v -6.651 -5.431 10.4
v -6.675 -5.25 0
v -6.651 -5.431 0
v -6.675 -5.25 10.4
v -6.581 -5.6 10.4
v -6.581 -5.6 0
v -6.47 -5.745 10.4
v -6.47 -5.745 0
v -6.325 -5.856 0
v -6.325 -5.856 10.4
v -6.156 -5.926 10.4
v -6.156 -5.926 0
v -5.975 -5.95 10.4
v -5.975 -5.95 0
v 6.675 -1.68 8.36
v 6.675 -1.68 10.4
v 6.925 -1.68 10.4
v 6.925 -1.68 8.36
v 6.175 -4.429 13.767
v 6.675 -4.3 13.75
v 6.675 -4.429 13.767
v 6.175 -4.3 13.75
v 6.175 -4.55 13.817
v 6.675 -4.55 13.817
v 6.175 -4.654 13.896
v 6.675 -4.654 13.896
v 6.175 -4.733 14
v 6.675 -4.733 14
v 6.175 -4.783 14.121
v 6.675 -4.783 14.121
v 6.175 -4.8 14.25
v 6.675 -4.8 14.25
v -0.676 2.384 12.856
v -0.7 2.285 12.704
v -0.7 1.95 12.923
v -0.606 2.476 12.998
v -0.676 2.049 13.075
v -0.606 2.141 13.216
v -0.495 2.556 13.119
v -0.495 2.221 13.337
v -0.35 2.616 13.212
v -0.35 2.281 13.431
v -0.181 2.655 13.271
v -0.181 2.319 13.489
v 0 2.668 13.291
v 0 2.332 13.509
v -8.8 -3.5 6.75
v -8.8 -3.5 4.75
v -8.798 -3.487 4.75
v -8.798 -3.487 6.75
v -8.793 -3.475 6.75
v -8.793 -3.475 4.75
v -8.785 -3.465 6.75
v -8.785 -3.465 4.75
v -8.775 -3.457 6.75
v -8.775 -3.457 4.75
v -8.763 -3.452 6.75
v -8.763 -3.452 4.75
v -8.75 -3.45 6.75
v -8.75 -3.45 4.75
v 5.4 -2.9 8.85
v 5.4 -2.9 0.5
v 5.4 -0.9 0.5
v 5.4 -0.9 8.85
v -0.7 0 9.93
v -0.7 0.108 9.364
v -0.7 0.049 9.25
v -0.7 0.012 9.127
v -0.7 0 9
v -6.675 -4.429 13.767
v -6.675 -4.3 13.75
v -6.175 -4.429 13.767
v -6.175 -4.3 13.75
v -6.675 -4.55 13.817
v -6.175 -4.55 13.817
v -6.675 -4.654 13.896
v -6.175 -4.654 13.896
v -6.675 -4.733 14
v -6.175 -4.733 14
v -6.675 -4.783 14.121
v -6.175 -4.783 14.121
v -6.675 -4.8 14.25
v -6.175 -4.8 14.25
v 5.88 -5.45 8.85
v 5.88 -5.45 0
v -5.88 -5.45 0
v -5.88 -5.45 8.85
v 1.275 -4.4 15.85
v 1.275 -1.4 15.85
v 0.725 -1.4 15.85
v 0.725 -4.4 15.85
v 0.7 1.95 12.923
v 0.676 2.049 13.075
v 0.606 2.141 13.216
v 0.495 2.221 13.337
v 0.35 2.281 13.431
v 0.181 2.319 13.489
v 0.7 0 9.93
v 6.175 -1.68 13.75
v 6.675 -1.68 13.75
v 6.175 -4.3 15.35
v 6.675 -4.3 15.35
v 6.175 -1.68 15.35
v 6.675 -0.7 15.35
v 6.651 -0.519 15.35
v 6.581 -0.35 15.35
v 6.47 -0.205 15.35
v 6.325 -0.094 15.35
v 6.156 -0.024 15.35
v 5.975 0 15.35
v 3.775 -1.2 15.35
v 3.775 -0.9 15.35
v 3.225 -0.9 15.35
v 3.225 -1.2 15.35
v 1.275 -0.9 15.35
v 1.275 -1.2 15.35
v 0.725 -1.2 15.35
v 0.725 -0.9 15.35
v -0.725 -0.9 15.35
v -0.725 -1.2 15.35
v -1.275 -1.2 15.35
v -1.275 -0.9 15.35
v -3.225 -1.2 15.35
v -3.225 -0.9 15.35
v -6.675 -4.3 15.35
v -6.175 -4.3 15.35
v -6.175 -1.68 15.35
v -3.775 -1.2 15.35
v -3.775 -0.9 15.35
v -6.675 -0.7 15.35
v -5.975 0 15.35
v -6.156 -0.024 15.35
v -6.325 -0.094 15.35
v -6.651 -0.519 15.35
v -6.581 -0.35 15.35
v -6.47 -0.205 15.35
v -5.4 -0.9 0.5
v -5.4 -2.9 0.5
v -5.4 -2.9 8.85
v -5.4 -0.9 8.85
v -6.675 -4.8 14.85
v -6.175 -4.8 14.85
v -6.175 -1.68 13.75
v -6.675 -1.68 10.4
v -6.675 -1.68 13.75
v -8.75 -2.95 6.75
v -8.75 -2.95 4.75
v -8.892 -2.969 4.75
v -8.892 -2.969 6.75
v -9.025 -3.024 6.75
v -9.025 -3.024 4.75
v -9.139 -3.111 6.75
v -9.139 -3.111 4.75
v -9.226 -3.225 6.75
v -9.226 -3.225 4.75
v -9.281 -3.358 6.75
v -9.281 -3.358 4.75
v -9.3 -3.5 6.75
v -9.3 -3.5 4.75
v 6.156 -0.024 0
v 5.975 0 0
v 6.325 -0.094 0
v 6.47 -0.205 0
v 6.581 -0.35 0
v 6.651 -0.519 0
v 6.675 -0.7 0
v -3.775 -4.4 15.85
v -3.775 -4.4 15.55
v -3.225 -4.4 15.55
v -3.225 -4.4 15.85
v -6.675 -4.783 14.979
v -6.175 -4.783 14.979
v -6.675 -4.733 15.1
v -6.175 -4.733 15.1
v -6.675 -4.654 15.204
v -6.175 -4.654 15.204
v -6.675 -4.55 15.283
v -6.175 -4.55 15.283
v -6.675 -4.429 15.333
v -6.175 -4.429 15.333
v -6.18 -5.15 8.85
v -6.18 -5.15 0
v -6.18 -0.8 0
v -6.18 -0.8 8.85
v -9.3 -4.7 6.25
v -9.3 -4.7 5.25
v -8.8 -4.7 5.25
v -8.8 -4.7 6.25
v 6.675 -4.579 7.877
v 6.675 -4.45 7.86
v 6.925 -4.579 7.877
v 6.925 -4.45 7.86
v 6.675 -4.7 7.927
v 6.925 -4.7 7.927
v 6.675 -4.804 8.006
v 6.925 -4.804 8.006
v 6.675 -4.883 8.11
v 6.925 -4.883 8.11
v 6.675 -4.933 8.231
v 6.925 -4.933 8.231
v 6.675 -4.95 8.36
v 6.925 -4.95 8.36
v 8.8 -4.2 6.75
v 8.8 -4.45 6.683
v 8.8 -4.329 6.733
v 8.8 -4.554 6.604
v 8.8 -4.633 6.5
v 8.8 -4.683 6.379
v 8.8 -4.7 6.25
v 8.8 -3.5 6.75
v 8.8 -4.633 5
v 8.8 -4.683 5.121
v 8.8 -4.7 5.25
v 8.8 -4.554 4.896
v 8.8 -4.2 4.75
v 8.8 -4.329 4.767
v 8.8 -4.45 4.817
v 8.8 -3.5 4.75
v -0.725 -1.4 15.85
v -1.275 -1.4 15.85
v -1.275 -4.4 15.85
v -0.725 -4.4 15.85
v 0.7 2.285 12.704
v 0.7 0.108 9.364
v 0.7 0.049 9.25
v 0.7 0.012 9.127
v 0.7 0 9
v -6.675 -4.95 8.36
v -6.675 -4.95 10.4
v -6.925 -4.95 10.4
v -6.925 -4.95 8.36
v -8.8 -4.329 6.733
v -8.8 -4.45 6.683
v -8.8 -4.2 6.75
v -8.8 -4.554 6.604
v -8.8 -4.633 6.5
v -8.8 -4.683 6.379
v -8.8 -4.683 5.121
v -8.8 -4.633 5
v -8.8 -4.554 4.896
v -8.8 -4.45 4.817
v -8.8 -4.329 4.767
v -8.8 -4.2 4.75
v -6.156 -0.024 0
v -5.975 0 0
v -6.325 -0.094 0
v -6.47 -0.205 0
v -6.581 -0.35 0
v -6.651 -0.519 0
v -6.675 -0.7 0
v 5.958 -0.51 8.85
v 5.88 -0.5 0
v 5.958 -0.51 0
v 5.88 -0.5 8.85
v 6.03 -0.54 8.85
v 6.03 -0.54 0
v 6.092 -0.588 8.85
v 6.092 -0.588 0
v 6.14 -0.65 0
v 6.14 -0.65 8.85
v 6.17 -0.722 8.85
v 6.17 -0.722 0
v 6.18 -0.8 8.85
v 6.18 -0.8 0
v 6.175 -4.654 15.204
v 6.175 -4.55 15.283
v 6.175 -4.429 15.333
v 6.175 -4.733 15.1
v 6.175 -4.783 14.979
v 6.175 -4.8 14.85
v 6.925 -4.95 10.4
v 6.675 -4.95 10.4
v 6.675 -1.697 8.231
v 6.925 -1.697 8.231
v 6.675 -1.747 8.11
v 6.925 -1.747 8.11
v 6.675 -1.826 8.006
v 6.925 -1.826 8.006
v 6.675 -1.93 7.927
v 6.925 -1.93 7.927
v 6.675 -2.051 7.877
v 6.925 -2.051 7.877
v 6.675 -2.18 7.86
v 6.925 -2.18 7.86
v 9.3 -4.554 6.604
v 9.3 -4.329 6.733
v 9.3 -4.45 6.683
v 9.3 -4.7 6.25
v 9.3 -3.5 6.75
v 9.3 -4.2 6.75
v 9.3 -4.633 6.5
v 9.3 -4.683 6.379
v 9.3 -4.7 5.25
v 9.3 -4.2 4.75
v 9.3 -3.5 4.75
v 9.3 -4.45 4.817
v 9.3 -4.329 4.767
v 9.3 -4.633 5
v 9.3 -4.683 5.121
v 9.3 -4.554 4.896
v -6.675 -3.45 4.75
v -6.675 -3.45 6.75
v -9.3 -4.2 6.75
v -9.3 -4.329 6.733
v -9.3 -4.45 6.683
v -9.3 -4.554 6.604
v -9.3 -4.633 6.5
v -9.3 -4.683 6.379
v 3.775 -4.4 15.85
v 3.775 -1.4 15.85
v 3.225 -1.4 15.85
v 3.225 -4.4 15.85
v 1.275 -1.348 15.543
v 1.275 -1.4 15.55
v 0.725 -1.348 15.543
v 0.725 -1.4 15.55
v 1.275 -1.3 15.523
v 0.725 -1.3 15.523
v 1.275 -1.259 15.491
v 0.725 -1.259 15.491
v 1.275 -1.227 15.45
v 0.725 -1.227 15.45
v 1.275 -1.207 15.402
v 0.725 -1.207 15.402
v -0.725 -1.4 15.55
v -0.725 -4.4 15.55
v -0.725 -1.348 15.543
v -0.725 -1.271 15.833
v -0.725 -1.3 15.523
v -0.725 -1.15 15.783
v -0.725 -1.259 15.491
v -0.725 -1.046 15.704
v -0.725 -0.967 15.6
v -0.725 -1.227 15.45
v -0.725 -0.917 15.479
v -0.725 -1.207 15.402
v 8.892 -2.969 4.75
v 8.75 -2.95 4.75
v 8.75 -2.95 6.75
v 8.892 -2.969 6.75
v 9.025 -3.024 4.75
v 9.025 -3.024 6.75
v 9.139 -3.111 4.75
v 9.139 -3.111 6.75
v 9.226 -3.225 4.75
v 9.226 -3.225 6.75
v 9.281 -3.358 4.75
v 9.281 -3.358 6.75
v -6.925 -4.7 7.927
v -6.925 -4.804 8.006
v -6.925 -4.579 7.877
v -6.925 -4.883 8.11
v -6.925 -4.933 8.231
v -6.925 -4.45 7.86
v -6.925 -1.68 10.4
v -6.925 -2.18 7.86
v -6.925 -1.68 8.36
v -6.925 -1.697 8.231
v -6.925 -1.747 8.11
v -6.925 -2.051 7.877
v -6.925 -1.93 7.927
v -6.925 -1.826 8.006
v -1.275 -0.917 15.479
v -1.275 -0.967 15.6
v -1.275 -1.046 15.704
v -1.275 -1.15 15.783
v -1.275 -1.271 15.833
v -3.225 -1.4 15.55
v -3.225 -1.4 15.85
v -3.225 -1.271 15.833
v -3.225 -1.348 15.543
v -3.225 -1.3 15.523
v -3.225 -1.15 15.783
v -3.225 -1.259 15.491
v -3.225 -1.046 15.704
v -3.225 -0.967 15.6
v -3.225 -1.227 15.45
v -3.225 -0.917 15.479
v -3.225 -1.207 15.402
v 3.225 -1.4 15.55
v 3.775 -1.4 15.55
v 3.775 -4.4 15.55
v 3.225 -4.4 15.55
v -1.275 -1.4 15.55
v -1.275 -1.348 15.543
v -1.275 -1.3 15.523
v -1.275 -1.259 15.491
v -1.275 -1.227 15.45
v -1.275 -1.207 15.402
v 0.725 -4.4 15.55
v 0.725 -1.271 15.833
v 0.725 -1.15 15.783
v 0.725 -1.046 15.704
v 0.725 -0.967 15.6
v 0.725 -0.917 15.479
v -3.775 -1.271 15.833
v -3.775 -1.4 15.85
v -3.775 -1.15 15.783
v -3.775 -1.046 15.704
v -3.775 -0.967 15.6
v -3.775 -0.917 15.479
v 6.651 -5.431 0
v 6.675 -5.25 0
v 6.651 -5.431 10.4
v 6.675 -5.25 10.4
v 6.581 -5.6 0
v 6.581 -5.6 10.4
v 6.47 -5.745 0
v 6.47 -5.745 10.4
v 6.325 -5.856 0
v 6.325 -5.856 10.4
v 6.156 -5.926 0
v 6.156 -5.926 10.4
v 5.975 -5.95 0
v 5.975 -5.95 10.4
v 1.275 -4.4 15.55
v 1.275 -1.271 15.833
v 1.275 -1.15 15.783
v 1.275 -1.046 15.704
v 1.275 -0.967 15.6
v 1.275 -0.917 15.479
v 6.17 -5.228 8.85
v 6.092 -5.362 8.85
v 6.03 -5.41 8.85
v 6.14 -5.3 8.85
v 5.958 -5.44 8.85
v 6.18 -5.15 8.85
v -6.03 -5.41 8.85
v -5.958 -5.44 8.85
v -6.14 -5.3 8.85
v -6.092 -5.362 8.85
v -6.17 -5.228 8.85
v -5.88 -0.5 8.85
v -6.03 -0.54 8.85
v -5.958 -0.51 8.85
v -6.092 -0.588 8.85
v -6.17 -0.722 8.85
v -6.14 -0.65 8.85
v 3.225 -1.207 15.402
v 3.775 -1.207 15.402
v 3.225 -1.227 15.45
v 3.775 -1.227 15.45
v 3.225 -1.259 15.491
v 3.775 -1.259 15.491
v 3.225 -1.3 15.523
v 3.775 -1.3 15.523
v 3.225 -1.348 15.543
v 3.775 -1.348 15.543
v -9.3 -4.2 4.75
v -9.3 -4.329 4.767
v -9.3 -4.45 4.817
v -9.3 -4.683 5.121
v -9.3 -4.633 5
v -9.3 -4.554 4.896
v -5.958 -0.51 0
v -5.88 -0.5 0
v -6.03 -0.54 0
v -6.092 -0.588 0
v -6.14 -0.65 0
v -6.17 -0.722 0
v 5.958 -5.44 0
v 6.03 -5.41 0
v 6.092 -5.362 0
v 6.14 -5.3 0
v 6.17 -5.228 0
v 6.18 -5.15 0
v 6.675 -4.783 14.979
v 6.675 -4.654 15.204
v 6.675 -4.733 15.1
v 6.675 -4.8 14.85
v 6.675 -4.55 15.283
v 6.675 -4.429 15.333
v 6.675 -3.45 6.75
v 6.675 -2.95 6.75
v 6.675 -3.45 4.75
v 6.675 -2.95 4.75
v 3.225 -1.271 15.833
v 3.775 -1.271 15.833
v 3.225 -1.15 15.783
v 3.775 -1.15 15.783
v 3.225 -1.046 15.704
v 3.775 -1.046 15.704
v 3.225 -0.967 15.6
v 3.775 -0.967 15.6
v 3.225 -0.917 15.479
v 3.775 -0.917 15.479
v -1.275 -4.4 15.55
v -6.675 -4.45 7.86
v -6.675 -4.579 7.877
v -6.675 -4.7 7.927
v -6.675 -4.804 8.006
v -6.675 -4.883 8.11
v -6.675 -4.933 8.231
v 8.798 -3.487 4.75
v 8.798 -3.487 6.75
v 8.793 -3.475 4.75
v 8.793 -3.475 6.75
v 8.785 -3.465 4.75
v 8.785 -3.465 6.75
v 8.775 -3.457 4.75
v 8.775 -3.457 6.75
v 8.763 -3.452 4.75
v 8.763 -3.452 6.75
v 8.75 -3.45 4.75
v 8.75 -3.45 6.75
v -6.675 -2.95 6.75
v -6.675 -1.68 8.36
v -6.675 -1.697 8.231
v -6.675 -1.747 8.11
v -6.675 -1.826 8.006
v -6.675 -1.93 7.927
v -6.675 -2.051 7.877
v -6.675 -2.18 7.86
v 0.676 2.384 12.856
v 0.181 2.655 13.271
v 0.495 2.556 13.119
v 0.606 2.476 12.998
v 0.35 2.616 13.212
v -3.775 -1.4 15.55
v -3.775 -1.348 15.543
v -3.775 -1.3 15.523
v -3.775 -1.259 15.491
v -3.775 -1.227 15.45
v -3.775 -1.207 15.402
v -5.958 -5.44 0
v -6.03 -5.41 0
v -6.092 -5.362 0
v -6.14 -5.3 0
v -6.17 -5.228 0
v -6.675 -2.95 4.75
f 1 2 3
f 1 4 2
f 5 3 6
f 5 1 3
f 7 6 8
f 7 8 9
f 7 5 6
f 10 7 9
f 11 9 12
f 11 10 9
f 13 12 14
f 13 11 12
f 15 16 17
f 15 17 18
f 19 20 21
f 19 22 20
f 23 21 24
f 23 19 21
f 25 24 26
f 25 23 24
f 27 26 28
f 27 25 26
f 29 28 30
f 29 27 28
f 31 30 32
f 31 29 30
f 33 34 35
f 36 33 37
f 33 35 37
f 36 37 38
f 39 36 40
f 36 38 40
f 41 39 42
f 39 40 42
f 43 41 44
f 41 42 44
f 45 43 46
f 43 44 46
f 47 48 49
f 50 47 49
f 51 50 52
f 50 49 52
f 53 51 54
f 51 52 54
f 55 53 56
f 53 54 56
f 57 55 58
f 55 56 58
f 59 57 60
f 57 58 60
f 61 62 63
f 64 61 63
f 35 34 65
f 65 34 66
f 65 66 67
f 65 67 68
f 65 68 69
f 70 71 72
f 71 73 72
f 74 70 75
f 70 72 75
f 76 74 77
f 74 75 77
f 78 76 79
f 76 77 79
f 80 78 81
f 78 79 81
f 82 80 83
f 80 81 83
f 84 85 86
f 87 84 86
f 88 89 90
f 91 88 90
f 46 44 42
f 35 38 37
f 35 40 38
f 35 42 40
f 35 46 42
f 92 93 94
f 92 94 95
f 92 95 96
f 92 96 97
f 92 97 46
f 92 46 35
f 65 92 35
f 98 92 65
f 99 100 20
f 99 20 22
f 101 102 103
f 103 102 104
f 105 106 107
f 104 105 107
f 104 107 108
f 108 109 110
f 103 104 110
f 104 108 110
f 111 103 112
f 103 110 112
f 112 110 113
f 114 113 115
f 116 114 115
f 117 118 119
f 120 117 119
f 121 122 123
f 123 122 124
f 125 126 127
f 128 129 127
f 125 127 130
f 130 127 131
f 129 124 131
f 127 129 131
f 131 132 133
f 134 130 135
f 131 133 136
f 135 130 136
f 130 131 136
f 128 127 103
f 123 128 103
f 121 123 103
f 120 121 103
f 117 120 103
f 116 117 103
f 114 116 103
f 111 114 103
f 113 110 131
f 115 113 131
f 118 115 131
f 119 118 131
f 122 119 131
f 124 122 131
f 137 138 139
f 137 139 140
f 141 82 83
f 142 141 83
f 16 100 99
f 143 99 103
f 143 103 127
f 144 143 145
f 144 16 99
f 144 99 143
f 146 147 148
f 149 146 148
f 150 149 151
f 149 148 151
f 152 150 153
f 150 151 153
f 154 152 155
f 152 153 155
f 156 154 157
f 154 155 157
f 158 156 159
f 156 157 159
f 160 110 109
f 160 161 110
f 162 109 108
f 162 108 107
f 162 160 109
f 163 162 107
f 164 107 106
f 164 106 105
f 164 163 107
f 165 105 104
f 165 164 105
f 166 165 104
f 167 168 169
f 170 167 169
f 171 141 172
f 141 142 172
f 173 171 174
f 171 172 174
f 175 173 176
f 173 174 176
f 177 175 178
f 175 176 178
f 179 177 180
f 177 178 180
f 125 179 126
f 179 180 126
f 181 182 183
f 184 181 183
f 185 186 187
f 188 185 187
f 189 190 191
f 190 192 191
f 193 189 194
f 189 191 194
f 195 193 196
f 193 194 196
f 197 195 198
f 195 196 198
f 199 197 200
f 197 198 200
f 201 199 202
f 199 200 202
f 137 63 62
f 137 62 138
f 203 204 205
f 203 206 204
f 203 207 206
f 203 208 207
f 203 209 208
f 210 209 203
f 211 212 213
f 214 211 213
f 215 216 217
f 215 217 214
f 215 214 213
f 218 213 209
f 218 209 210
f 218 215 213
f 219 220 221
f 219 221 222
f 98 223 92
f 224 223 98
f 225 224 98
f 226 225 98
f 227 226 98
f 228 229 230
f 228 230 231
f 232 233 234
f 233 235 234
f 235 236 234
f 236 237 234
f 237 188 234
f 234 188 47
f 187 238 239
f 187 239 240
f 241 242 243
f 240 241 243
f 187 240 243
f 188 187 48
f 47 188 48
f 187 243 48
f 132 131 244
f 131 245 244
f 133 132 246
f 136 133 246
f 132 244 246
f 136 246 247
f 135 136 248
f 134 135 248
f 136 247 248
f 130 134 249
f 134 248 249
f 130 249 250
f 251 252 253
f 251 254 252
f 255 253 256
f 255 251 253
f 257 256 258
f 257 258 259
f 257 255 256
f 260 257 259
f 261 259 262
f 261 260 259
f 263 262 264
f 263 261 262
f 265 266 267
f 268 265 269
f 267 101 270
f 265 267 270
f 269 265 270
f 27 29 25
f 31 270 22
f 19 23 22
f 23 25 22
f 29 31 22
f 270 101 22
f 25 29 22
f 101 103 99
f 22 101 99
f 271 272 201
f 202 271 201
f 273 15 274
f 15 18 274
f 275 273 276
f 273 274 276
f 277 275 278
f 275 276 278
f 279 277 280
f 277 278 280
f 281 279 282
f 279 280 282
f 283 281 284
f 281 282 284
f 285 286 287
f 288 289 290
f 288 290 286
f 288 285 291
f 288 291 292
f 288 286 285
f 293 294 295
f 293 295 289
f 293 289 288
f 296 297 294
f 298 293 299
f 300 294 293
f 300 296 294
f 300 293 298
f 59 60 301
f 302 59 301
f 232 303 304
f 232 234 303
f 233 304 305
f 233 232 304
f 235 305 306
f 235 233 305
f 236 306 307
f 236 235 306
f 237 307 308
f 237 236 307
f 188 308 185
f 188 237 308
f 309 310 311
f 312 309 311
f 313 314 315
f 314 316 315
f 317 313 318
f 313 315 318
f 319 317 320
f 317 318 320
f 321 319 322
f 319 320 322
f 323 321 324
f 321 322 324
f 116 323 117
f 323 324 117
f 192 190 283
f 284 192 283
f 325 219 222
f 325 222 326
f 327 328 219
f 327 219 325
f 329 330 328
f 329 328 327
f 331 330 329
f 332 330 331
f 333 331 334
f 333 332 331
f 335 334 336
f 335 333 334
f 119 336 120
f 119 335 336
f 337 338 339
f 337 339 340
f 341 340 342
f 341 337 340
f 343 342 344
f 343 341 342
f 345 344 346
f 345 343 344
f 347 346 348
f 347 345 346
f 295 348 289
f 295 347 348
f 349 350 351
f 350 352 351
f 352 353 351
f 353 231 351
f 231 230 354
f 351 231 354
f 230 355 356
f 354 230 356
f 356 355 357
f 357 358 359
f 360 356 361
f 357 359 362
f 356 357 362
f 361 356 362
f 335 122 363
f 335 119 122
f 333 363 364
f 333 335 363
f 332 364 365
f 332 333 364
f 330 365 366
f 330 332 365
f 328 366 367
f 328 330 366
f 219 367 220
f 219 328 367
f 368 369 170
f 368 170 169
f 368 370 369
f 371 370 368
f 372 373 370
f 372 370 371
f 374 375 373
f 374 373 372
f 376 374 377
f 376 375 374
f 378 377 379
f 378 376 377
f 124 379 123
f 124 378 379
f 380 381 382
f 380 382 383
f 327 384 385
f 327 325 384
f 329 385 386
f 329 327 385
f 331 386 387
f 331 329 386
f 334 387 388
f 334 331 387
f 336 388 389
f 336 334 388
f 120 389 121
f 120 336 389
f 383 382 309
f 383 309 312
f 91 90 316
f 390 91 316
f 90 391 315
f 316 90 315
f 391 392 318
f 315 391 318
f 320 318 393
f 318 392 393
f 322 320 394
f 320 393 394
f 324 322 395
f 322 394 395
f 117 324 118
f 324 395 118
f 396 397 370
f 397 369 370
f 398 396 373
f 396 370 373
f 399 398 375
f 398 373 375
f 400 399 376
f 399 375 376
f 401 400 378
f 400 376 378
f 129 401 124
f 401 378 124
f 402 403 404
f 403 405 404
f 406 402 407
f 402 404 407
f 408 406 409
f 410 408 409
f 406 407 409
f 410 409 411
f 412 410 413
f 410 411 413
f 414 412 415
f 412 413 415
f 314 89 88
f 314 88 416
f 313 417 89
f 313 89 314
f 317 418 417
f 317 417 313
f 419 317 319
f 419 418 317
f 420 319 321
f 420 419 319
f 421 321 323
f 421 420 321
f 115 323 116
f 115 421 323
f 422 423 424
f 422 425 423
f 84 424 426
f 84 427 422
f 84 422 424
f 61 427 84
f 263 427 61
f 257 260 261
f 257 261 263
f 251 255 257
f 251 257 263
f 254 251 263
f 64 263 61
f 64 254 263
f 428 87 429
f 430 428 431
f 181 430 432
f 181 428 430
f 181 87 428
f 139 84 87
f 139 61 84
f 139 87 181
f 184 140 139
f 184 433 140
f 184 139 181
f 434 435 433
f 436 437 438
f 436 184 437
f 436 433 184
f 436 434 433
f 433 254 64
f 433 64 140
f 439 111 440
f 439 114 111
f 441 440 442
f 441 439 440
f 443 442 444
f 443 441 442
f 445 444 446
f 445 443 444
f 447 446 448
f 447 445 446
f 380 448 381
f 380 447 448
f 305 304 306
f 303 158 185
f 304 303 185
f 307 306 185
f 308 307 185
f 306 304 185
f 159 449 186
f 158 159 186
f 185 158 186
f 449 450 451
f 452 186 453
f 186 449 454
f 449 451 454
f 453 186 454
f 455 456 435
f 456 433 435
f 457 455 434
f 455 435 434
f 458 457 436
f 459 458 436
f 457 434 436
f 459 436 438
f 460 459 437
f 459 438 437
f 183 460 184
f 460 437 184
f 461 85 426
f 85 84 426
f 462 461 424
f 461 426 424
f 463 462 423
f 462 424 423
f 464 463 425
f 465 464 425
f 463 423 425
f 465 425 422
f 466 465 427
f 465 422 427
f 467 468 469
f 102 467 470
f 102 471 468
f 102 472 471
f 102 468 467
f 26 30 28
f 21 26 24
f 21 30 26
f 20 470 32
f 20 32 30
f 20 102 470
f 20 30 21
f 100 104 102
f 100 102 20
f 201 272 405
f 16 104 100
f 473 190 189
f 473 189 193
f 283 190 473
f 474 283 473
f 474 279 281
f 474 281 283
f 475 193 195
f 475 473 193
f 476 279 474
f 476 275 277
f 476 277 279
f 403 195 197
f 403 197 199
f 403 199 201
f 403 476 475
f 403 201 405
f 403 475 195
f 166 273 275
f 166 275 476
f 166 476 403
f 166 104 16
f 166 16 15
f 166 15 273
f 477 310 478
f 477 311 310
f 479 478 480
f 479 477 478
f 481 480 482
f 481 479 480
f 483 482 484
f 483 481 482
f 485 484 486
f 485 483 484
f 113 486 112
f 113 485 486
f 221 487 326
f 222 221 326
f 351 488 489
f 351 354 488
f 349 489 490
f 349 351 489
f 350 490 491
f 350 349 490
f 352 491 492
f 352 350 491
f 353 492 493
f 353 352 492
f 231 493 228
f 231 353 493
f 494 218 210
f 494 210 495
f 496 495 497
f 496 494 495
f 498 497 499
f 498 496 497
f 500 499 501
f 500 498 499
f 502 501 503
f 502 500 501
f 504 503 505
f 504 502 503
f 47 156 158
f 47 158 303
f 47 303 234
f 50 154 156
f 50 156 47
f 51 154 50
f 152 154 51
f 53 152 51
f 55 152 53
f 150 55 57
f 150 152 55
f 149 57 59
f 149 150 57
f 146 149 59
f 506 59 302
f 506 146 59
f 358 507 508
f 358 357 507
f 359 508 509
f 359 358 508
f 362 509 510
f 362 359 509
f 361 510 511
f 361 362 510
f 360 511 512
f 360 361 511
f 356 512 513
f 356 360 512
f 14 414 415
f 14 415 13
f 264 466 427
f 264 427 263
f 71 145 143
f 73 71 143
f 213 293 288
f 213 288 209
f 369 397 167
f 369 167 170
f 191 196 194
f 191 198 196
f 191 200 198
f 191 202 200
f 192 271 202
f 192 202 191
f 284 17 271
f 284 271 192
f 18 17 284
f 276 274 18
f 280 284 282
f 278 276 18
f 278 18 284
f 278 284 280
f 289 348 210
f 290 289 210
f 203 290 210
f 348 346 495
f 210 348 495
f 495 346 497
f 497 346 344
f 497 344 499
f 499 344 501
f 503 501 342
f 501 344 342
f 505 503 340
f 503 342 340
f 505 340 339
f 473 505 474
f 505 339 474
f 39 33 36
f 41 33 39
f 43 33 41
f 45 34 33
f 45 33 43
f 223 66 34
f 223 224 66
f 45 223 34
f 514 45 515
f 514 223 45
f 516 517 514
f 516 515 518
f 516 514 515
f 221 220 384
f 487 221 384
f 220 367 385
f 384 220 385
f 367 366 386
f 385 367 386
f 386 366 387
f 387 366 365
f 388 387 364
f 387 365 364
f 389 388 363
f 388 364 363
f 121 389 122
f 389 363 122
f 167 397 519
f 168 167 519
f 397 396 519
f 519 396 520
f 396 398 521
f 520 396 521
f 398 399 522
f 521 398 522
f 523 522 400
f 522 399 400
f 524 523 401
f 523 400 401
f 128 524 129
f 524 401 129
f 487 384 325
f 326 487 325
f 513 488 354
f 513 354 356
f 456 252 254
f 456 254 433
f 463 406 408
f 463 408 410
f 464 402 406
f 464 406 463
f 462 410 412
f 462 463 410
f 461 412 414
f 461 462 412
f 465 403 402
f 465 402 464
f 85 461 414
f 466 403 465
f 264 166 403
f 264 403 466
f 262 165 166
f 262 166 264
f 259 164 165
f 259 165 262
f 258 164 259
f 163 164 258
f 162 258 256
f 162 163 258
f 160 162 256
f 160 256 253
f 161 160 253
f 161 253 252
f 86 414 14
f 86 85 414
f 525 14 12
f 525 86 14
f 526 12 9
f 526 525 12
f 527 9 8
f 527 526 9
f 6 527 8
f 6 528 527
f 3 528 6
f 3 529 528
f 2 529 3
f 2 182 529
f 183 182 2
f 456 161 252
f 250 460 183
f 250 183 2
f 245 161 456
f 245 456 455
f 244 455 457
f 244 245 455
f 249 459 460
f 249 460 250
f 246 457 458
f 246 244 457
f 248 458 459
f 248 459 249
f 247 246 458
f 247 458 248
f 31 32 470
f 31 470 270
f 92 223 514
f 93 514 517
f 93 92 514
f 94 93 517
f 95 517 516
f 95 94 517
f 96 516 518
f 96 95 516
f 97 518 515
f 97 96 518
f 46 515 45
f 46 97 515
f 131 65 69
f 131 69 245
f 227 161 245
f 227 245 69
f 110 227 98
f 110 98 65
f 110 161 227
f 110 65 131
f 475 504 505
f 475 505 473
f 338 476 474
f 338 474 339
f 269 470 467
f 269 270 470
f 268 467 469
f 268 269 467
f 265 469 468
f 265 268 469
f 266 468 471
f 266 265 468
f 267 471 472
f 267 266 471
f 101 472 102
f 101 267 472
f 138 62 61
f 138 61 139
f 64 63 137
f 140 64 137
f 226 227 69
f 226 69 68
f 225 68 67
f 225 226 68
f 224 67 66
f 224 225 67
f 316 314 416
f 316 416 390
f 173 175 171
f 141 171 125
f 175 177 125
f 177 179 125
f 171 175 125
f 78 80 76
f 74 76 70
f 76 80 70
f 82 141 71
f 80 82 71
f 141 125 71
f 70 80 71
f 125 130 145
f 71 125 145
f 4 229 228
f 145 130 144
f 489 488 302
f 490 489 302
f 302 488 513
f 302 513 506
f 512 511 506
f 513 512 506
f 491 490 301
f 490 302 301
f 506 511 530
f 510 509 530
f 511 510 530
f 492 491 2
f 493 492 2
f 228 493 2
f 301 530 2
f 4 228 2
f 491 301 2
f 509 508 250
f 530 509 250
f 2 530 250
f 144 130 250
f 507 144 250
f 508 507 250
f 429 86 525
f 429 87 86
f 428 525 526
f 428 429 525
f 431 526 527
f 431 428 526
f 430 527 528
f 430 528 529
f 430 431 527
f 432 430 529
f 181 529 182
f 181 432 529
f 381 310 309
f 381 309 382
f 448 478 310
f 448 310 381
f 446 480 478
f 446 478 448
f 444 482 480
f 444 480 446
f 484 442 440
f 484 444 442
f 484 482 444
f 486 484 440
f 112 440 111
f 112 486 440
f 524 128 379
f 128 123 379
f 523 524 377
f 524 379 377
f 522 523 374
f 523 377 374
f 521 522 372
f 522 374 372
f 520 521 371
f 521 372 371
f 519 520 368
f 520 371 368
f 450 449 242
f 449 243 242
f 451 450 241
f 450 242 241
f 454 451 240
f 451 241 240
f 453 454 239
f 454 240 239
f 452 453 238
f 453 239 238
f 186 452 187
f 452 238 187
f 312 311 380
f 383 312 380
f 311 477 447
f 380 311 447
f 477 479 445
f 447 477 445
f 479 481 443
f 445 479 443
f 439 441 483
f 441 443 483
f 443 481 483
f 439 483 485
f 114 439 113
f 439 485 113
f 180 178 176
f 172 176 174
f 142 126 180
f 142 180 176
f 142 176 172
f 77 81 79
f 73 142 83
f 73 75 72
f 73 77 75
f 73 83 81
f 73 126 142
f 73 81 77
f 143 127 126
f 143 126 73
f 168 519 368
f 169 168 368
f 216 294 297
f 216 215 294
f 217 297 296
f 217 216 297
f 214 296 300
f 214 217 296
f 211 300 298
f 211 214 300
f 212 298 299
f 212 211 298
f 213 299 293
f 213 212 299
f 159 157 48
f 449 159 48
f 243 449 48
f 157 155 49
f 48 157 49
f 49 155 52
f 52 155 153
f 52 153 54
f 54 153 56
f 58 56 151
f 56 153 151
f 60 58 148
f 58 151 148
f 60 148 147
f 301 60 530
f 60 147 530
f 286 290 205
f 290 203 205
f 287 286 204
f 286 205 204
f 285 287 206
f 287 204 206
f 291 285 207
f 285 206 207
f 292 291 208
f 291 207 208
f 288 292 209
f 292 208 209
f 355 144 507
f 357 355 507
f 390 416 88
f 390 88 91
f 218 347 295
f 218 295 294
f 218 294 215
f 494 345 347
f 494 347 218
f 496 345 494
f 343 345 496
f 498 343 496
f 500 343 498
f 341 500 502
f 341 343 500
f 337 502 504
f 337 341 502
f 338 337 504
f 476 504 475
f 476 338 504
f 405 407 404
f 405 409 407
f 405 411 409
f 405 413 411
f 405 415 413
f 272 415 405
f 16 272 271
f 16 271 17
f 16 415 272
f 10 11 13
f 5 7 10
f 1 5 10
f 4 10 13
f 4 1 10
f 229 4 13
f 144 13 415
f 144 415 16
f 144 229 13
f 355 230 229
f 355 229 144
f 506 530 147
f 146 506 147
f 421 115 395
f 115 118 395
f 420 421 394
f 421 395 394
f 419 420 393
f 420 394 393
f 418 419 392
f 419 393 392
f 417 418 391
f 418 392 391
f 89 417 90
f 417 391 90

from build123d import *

# Parameters (mm, degrees)
SKIZZE1_W                         = 6.675
SKIZZE1_H                         = 4.27
AUFSATZ_LINEAR_AUSTRAGEN1_DEPTH   = 10.4
SKIZZE1_3_W                       = 6.675
SKIZZE1_3_H                       = 1.68
AUFSATZ_LINEAR_AUSTRAGEN2_DEPTH   = 15.35
LINEAR_AUSTRAGEN_D_NN1_START      = 4.75
LINEAR_AUSTRAGEN_D_NN1_DEPTH      = 2
SKIZZE3_W                         = 0.5
SKIZZE3_H                         = 1.6
AUFSATZ_LINEAR_AUSTRAGEN3_DEPTH   = 4.8
SKIZZE4_W                         = 7.337223246
SKIZZE4_H                         = 4.95
SCHNITT_LINEAR_AUSTRAGEN1_DEPTH   = 8.85
AUFSATZ_LINEAR_AUSTRAGEN4_REACH   = 21.408
AUFSATZ_LINEAR_START              = 0.5
SKIZZE5_W                         = 5.4
SKIZZE5_H                         = 2
AUFSATZ_LINEAR_START_2            = -0.9
SKIZZE6_W                         = 0.55
SKIZZE6_H                         = 0.3
AUFSATZ_LINEAR_AUSTRAGEN5_DEPTH   = 3.5
AUFSATZ_LINEAR_AUSTRAGEN5_2_DEPTH = 3.5
SKIZZE6_3_W                       = 0.55
SKIZZE6_3_H                       = 0.2
AUFSATZ_LINEAR_AUSTRAGEN6_DEPTH   = 0.3
VERRUNDUNG1_R                     = 0.2
VERRUNDUNG2_R                     = 0.5
VERRUNDUNG3_R                     = 0.3
VERRUNDUNG4_R                     = 0.7
AUFSATZ_LINEAR_START_3            = -6.675
SKIZZE7_W                         = 2.54
SKIZZE7_H                         = 3.27
AUFSATZ_LINEAR_AUSTRAGEN7_DEPTH   = 0.25
VERRUNDUNG6_R                     = 0.5
VERRUNDUNG7_R                     = 0.5
LINEAR_AUSTRAGEN_D_NN2_DEPTH      = 0.7
VERRUNDUNG5_R                     = 0.7


with BuildPart() as part:
    # Skizze1 → Aufsatz-Linear austragen1 (new body)
    with BuildSketch(Plane.XY):
        with Locations((-3.3375, -3.815)):
            Rectangle(SKIZZE1_W, SKIZZE1_H)
    extrude(amount=AUFSATZ_LINEAR_AUSTRAGEN1_DEPTH)

    # Skizze1<3> → Aufsatz-Linear austragen2 (add)
    with BuildSketch(Plane.XY):
        with Locations((-3.3375, -0.84)):
            Rectangle(SKIZZE1_3_W, SKIZZE1_3_H)
    extrude(amount=AUFSATZ_LINEAR_AUSTRAGEN2_DEPTH)

    # Skizze2 → Linear-Austragen-Dünn1 (add)
    with BuildSketch(Plane.XY.offset(LINEAR_AUSTRAGEN_D_NN1_START)):
        with BuildLine():
            Line((0, -2.95), (-8.75, -2.95))
            ThreePointArc((-8.75, -2.95), (-9.13890873, -3.11109127), (-9.3, -3.5))
            Line((-9.3, -3.5), (-9.3, -4.7))
            Line((-9.3, -4.7), (-8.8, -4.7))
            Line((-8.8, -4.7), (-8.8, -3.5))
            ThreePointArc((-8.8, -3.5), (-8.785355339, -3.464644661), (-8.75, -3.45))
            Line((-8.75, -3.45), (0, -3.45))
            Line((0, -3.45), (0, -2.95))
        make_face()
    extrude(amount=LINEAR_AUSTRAGEN_D_NN1_DEPTH)

    # Skizze3 → Aufsatz-Linear austragen3 (add)
    with BuildSketch(Plane(origin=(0, 0, 0), x_dir=(1, 0, 0), z_dir=(0, 1, 0))):
        with Locations((-6.425, -14.55)):
            Rectangle(SKIZZE3_W, SKIZZE3_H)
    extrude(amount=-AUFSATZ_LINEAR_AUSTRAGEN3_DEPTH)

    # Skizze4 → Schnitt-Linear austragen1 (cut)
    with BuildSketch(Plane.XY):
        with Locations((-2.511388377, -2.975)):
            Rectangle(SKIZZE4_W, SKIZZE4_H)
    extrude(amount=SCHNITT_LINEAR_AUSTRAGEN1_DEPTH, mode=Mode.SUBTRACT)

    # Skizze5 → Aufsatz-Linear austragen4 (add, up to next)
    with BuildSketch(Plane.XY.offset(AUFSATZ_LINEAR_START), mode=Mode.PRIVATE) as aufsatz_linear_austragen4_sk1:
        with Locations((-2.7, -1.9)):
            Rectangle(SKIZZE5_W, SKIZZE5_H)
    aufsatz_linear_austragen4_tool1 = extrude(aufsatz_linear_austragen4_sk1.sketch, amount=AUFSATZ_LINEAR_AUSTRAGEN4_REACH, mode=Mode.PRIVATE) - part.part
    add(aufsatz_linear_austragen4_tool1.solids().sort_by_distance((-2.7, -1.9, 0.5))[0])



with BuildPart() as body_2:
    # Skizze6 → Aufsatz-Linear austragen5 (new body)
    with BuildSketch(Plane(origin=(0, 0, 0), x_dir=(1, 0, 0), z_dir=(0, 1, 0)).offset(AUFSATZ_LINEAR_START_2)):
        with Locations((-1, -15.7)):
            Rectangle(SKIZZE6_W, SKIZZE6_H)
    extrude(amount=-AUFSATZ_LINEAR_AUSTRAGEN5_DEPTH)


with BuildPart() as body_3:
    # Skizze6 → Aufsatz-Linear austragen5 2 (new body)
    with BuildSketch(Plane(origin=(0, 0, 0), x_dir=(1, 0, 0), z_dir=(0, 1, 0)).offset(AUFSATZ_LINEAR_START_2)):
        with Locations((-3.5, -15.7)):
            Rectangle(SKIZZE6_W, SKIZZE6_H)
    extrude(amount=-AUFSATZ_LINEAR_AUSTRAGEN5_2_DEPTH)


with BuildPart() as part_1:
    add(part.part)

    add(body_2.part)  # Aufsatz-Linear austragen6 merges body 2

    add(body_3.part)  # Aufsatz-Linear austragen6 merges body 3
    # Skizze6<3> → Aufsatz-Linear austragen6 (add)
    with BuildSketch(Plane(origin=(0, 0, 0), x_dir=(1, 0, 0), z_dir=(0, 1, 0)).offset(AUFSATZ_LINEAR_START_2)):
        with Locations((-3.5, -15.45)):
            Rectangle(SKIZZE6_3_W, SKIZZE6_3_H)
        with Locations((-1, -15.45)):
            Rectangle(SKIZZE6_3_W, SKIZZE6_3_H)
    extrude(amount=-AUFSATZ_LINEAR_AUSTRAGEN6_DEPTH)

    # Verrundung1
    verrundung1_edges = [part_1.edges().sort_by_distance(p)[0] for p in [
        (-3.5, -1.2, 15.55),
        (-1, -1.2, 15.55),
    ]]
    fillet(verrundung1_edges, radius=VERRUNDUNG1_R - 0.0001)  # a hair under: the kernel refuses the full size

    # Verrundung2
    verrundung2_edges = [part_1.edges().sort_by_distance(p)[0] for p in [
        (-1, -0.9, 15.85),
        (-3.5, -0.9, 15.85),
    ]]
    fillet(verrundung2_edges, radius=VERRUNDUNG2_R - 0.0001)  # a hair under: the kernel refuses the full size

    # Verrundung3
    verrundung3_edges = [part_1.edges().sort_by_distance(p)[0] for p in [
        (-6.18, -0.5, 4.425),
        (-6.18, -5.45, 4.425),
    ]]
    fillet(verrundung3_edges, radius=VERRUNDUNG3_R)

    # Verrundung4
    verrundung4_edges = [part_1.edges().sort_by_distance(p)[0] for p in [
        (-6.675, 0, 7.675),
        (-6.675, -5.95, 5.2),
    ]]
    fillet(verrundung4_edges, radius=VERRUNDUNG4_R)

    # Skizze7 → Aufsatz-Linear austragen7 (add)
    with BuildSketch(Plane(origin=(0, 0, 0), x_dir=(0, 0, -1), z_dir=(1, 0, 0)).offset(AUFSATZ_LINEAR_START_3)):
        with Locations((-9.13, -3.315)):
            Rectangle(SKIZZE7_W, SKIZZE7_H)
    extrude(amount=-AUFSATZ_LINEAR_AUSTRAGEN7_DEPTH)

    # Verrundung6
    verrundung6_edges = [part_1.edges().sort_by_distance(p)[0] for p in [
        (-9.05, -4.7, 4.75),
        (-9.05, -4.7, 6.75),
        (-6.425, -4.8, 13.75),
        (-6.425, -4.8, 15.35),
    ]]
    fillet(verrundung6_edges, radius=VERRUNDUNG6_R)

    # Verrundung7
    verrundung7_edges = [part_1.edges().sort_by_distance(p)[0] for p in [
        (-6.8, -1.68, 7.86),
        (-6.8, -4.95, 7.86),
    ]]
    fillet(verrundung7_edges, radius=VERRUNDUNG7_R)

    # Spiegeln1: part across plane


with BuildPart() as part_2:
    add(part_1.part)
    add(part_1.part.mirror(Plane(origin=(0, 0, 0), x_dir=(0, 0, 1), z_dir=(1, 0, 0))))

    # Skizze8 → Linear-Austragen-Dünn2 (add, symmetric)
    with BuildSketch(Plane(origin=(0, 0, 0), x_dir=(0, 0, -1), z_dir=(1, 0, 0))):
        with BuildLine():
            Line((-7.127333731, 0), (-9, 0))
            ThreePointArc((-9, 0), (-9.189684168, 0.027582553), (-9.363657097, 0.108045593))
            Line((-9.363657097, 0.108045593), (-13.2907964, 2.667554689))
            Line((-13.2907964, 2.667554689), (-13.5092036, 2.332445311))
            Line((-13.5092036, 2.332445311), (-9.582064297, -0.227063785))
            ThreePointArc((-9.582064297, -0.227063785), (-9.303605739, -0.355851764), (-9, -0.4))
            Line((-9, -0.4), (-7.127333731, -0.4))
            Line((-7.127333731, -0.4), (-7.127333731, 0))
        make_face()
    extrude(amount=LINEAR_AUSTRAGEN_D_NN2_DEPTH, both=True)

    # Verrundung5
    verrundung5_edges = [part_2.edges().sort_by_distance(p)[0] for p in [
        (-0.7, 2.5, 13.4),
        (0.7, 2.5, 13.4),
    ]]
    fillet(verrundung5_edges, radius=VERRUNDUNG5_R - 0.0001)  # a hair under: the kernel refuses the full size


solid = part_2.part
